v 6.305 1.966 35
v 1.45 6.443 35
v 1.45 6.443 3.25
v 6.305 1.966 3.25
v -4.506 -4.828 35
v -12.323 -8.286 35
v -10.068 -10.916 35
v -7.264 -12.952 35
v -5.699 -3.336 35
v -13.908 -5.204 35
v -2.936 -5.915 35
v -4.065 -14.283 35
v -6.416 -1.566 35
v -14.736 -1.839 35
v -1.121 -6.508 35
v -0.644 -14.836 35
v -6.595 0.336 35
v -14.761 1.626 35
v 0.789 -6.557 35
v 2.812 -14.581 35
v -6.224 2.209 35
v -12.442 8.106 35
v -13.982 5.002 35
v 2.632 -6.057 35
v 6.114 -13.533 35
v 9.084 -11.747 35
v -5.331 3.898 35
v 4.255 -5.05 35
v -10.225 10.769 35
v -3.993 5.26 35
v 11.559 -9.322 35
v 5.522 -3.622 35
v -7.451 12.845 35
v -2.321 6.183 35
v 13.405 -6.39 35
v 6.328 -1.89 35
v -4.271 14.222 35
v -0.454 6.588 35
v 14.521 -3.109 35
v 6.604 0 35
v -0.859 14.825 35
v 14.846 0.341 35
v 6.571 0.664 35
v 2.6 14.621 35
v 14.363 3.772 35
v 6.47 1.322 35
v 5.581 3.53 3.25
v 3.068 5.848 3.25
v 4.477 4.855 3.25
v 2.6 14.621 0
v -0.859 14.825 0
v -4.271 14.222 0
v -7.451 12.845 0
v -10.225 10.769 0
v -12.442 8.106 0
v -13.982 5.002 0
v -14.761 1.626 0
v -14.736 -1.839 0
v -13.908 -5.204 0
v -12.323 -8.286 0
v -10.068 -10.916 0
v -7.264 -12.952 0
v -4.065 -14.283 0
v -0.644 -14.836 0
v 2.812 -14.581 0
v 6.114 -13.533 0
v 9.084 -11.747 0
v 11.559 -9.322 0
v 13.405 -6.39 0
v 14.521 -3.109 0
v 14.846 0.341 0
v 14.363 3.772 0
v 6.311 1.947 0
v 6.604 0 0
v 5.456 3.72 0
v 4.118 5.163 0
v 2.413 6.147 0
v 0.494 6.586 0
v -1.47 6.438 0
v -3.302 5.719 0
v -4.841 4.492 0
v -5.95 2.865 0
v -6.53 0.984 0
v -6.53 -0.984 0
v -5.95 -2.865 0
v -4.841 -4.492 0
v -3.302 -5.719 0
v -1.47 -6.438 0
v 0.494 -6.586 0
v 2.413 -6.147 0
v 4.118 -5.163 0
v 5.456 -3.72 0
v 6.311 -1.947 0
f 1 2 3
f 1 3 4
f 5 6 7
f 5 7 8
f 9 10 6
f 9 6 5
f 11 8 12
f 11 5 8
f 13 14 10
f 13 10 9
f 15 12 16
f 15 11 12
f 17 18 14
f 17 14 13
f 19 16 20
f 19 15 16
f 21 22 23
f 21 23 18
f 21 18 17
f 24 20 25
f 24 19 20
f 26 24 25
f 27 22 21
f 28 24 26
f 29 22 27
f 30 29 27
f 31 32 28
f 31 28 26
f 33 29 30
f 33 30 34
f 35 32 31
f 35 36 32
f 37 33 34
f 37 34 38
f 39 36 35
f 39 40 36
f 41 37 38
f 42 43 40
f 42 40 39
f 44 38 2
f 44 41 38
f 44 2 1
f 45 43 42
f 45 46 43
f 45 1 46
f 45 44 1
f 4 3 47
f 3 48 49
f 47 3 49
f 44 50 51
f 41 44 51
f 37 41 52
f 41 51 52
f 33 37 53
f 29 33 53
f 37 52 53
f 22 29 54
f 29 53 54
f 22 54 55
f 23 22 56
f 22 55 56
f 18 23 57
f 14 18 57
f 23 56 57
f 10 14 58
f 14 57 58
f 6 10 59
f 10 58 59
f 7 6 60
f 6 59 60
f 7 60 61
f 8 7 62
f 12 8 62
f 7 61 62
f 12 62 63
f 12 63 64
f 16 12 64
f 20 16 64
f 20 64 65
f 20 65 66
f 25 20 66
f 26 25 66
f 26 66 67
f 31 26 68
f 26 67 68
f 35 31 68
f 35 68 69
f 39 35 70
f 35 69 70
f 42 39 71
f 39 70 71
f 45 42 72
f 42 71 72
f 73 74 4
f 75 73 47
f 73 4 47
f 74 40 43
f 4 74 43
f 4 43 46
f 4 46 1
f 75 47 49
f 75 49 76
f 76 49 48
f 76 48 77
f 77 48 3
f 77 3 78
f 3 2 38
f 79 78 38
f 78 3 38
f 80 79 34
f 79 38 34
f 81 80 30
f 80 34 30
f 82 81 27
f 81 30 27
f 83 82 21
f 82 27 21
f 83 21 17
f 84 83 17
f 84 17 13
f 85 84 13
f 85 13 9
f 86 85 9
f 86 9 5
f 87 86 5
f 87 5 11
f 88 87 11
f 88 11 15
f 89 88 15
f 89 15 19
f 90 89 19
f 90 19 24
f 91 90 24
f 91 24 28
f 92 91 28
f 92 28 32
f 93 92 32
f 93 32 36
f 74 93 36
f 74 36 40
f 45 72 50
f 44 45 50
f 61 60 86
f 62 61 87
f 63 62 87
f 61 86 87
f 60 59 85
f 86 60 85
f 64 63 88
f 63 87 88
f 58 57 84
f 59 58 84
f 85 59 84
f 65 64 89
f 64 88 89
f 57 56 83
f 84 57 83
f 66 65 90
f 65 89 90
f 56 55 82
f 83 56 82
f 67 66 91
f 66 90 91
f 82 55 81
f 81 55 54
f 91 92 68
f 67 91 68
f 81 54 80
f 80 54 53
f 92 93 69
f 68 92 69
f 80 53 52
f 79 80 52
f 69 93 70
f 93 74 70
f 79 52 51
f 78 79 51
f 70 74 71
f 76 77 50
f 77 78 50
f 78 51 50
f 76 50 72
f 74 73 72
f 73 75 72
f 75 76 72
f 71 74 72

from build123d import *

# Parameters (mm, degrees)
F1_DEPTH = 35
F2_R     = 6.604
F3_DEPTH = 38.1
F5_DEPTH = 31.75


# Not quite as in the source:
# - a feature names something its author has since deleted; it is built from what else it names


with BuildPart() as f1:
    # F0 (on Top) → F1 (new body)
    with BuildSketch(Plane.XY):
        with BuildLine():
            Line((14.3630077291, 3.7718044718), (2.6000410284, 14.6206117058))
            ThreePointArc((2.6000410284, 14.6206117058), (-10.0677907401, -10.9161389517), (14.3630077291, 3.7718044718))
        make_face()
    extrude(amount=F1_DEPTH)

    # F2 (on face) → F3 (cut)
    with BuildSketch(Plane.XY.offset(35)):
        Circle(F2_R)
    extrude(amount=-F3_DEPTH, mode=Mode.SUBTRACT)

    # F4 (on face) → F5 (join)
    with BuildSketch(Plane.XY.offset(35)):
        with BuildLine():
            ThreePointArc((6.3047218477, 1.9655275177), (4.4772855251, 4.854557686), (1.4501641617, 6.4428130428))
            Line((1.4501641617, 6.4428130428), (6.3047218477, 1.9655275177))
        make_face()
    extrude(amount=-F5_DEPTH)


solid = f1.part
